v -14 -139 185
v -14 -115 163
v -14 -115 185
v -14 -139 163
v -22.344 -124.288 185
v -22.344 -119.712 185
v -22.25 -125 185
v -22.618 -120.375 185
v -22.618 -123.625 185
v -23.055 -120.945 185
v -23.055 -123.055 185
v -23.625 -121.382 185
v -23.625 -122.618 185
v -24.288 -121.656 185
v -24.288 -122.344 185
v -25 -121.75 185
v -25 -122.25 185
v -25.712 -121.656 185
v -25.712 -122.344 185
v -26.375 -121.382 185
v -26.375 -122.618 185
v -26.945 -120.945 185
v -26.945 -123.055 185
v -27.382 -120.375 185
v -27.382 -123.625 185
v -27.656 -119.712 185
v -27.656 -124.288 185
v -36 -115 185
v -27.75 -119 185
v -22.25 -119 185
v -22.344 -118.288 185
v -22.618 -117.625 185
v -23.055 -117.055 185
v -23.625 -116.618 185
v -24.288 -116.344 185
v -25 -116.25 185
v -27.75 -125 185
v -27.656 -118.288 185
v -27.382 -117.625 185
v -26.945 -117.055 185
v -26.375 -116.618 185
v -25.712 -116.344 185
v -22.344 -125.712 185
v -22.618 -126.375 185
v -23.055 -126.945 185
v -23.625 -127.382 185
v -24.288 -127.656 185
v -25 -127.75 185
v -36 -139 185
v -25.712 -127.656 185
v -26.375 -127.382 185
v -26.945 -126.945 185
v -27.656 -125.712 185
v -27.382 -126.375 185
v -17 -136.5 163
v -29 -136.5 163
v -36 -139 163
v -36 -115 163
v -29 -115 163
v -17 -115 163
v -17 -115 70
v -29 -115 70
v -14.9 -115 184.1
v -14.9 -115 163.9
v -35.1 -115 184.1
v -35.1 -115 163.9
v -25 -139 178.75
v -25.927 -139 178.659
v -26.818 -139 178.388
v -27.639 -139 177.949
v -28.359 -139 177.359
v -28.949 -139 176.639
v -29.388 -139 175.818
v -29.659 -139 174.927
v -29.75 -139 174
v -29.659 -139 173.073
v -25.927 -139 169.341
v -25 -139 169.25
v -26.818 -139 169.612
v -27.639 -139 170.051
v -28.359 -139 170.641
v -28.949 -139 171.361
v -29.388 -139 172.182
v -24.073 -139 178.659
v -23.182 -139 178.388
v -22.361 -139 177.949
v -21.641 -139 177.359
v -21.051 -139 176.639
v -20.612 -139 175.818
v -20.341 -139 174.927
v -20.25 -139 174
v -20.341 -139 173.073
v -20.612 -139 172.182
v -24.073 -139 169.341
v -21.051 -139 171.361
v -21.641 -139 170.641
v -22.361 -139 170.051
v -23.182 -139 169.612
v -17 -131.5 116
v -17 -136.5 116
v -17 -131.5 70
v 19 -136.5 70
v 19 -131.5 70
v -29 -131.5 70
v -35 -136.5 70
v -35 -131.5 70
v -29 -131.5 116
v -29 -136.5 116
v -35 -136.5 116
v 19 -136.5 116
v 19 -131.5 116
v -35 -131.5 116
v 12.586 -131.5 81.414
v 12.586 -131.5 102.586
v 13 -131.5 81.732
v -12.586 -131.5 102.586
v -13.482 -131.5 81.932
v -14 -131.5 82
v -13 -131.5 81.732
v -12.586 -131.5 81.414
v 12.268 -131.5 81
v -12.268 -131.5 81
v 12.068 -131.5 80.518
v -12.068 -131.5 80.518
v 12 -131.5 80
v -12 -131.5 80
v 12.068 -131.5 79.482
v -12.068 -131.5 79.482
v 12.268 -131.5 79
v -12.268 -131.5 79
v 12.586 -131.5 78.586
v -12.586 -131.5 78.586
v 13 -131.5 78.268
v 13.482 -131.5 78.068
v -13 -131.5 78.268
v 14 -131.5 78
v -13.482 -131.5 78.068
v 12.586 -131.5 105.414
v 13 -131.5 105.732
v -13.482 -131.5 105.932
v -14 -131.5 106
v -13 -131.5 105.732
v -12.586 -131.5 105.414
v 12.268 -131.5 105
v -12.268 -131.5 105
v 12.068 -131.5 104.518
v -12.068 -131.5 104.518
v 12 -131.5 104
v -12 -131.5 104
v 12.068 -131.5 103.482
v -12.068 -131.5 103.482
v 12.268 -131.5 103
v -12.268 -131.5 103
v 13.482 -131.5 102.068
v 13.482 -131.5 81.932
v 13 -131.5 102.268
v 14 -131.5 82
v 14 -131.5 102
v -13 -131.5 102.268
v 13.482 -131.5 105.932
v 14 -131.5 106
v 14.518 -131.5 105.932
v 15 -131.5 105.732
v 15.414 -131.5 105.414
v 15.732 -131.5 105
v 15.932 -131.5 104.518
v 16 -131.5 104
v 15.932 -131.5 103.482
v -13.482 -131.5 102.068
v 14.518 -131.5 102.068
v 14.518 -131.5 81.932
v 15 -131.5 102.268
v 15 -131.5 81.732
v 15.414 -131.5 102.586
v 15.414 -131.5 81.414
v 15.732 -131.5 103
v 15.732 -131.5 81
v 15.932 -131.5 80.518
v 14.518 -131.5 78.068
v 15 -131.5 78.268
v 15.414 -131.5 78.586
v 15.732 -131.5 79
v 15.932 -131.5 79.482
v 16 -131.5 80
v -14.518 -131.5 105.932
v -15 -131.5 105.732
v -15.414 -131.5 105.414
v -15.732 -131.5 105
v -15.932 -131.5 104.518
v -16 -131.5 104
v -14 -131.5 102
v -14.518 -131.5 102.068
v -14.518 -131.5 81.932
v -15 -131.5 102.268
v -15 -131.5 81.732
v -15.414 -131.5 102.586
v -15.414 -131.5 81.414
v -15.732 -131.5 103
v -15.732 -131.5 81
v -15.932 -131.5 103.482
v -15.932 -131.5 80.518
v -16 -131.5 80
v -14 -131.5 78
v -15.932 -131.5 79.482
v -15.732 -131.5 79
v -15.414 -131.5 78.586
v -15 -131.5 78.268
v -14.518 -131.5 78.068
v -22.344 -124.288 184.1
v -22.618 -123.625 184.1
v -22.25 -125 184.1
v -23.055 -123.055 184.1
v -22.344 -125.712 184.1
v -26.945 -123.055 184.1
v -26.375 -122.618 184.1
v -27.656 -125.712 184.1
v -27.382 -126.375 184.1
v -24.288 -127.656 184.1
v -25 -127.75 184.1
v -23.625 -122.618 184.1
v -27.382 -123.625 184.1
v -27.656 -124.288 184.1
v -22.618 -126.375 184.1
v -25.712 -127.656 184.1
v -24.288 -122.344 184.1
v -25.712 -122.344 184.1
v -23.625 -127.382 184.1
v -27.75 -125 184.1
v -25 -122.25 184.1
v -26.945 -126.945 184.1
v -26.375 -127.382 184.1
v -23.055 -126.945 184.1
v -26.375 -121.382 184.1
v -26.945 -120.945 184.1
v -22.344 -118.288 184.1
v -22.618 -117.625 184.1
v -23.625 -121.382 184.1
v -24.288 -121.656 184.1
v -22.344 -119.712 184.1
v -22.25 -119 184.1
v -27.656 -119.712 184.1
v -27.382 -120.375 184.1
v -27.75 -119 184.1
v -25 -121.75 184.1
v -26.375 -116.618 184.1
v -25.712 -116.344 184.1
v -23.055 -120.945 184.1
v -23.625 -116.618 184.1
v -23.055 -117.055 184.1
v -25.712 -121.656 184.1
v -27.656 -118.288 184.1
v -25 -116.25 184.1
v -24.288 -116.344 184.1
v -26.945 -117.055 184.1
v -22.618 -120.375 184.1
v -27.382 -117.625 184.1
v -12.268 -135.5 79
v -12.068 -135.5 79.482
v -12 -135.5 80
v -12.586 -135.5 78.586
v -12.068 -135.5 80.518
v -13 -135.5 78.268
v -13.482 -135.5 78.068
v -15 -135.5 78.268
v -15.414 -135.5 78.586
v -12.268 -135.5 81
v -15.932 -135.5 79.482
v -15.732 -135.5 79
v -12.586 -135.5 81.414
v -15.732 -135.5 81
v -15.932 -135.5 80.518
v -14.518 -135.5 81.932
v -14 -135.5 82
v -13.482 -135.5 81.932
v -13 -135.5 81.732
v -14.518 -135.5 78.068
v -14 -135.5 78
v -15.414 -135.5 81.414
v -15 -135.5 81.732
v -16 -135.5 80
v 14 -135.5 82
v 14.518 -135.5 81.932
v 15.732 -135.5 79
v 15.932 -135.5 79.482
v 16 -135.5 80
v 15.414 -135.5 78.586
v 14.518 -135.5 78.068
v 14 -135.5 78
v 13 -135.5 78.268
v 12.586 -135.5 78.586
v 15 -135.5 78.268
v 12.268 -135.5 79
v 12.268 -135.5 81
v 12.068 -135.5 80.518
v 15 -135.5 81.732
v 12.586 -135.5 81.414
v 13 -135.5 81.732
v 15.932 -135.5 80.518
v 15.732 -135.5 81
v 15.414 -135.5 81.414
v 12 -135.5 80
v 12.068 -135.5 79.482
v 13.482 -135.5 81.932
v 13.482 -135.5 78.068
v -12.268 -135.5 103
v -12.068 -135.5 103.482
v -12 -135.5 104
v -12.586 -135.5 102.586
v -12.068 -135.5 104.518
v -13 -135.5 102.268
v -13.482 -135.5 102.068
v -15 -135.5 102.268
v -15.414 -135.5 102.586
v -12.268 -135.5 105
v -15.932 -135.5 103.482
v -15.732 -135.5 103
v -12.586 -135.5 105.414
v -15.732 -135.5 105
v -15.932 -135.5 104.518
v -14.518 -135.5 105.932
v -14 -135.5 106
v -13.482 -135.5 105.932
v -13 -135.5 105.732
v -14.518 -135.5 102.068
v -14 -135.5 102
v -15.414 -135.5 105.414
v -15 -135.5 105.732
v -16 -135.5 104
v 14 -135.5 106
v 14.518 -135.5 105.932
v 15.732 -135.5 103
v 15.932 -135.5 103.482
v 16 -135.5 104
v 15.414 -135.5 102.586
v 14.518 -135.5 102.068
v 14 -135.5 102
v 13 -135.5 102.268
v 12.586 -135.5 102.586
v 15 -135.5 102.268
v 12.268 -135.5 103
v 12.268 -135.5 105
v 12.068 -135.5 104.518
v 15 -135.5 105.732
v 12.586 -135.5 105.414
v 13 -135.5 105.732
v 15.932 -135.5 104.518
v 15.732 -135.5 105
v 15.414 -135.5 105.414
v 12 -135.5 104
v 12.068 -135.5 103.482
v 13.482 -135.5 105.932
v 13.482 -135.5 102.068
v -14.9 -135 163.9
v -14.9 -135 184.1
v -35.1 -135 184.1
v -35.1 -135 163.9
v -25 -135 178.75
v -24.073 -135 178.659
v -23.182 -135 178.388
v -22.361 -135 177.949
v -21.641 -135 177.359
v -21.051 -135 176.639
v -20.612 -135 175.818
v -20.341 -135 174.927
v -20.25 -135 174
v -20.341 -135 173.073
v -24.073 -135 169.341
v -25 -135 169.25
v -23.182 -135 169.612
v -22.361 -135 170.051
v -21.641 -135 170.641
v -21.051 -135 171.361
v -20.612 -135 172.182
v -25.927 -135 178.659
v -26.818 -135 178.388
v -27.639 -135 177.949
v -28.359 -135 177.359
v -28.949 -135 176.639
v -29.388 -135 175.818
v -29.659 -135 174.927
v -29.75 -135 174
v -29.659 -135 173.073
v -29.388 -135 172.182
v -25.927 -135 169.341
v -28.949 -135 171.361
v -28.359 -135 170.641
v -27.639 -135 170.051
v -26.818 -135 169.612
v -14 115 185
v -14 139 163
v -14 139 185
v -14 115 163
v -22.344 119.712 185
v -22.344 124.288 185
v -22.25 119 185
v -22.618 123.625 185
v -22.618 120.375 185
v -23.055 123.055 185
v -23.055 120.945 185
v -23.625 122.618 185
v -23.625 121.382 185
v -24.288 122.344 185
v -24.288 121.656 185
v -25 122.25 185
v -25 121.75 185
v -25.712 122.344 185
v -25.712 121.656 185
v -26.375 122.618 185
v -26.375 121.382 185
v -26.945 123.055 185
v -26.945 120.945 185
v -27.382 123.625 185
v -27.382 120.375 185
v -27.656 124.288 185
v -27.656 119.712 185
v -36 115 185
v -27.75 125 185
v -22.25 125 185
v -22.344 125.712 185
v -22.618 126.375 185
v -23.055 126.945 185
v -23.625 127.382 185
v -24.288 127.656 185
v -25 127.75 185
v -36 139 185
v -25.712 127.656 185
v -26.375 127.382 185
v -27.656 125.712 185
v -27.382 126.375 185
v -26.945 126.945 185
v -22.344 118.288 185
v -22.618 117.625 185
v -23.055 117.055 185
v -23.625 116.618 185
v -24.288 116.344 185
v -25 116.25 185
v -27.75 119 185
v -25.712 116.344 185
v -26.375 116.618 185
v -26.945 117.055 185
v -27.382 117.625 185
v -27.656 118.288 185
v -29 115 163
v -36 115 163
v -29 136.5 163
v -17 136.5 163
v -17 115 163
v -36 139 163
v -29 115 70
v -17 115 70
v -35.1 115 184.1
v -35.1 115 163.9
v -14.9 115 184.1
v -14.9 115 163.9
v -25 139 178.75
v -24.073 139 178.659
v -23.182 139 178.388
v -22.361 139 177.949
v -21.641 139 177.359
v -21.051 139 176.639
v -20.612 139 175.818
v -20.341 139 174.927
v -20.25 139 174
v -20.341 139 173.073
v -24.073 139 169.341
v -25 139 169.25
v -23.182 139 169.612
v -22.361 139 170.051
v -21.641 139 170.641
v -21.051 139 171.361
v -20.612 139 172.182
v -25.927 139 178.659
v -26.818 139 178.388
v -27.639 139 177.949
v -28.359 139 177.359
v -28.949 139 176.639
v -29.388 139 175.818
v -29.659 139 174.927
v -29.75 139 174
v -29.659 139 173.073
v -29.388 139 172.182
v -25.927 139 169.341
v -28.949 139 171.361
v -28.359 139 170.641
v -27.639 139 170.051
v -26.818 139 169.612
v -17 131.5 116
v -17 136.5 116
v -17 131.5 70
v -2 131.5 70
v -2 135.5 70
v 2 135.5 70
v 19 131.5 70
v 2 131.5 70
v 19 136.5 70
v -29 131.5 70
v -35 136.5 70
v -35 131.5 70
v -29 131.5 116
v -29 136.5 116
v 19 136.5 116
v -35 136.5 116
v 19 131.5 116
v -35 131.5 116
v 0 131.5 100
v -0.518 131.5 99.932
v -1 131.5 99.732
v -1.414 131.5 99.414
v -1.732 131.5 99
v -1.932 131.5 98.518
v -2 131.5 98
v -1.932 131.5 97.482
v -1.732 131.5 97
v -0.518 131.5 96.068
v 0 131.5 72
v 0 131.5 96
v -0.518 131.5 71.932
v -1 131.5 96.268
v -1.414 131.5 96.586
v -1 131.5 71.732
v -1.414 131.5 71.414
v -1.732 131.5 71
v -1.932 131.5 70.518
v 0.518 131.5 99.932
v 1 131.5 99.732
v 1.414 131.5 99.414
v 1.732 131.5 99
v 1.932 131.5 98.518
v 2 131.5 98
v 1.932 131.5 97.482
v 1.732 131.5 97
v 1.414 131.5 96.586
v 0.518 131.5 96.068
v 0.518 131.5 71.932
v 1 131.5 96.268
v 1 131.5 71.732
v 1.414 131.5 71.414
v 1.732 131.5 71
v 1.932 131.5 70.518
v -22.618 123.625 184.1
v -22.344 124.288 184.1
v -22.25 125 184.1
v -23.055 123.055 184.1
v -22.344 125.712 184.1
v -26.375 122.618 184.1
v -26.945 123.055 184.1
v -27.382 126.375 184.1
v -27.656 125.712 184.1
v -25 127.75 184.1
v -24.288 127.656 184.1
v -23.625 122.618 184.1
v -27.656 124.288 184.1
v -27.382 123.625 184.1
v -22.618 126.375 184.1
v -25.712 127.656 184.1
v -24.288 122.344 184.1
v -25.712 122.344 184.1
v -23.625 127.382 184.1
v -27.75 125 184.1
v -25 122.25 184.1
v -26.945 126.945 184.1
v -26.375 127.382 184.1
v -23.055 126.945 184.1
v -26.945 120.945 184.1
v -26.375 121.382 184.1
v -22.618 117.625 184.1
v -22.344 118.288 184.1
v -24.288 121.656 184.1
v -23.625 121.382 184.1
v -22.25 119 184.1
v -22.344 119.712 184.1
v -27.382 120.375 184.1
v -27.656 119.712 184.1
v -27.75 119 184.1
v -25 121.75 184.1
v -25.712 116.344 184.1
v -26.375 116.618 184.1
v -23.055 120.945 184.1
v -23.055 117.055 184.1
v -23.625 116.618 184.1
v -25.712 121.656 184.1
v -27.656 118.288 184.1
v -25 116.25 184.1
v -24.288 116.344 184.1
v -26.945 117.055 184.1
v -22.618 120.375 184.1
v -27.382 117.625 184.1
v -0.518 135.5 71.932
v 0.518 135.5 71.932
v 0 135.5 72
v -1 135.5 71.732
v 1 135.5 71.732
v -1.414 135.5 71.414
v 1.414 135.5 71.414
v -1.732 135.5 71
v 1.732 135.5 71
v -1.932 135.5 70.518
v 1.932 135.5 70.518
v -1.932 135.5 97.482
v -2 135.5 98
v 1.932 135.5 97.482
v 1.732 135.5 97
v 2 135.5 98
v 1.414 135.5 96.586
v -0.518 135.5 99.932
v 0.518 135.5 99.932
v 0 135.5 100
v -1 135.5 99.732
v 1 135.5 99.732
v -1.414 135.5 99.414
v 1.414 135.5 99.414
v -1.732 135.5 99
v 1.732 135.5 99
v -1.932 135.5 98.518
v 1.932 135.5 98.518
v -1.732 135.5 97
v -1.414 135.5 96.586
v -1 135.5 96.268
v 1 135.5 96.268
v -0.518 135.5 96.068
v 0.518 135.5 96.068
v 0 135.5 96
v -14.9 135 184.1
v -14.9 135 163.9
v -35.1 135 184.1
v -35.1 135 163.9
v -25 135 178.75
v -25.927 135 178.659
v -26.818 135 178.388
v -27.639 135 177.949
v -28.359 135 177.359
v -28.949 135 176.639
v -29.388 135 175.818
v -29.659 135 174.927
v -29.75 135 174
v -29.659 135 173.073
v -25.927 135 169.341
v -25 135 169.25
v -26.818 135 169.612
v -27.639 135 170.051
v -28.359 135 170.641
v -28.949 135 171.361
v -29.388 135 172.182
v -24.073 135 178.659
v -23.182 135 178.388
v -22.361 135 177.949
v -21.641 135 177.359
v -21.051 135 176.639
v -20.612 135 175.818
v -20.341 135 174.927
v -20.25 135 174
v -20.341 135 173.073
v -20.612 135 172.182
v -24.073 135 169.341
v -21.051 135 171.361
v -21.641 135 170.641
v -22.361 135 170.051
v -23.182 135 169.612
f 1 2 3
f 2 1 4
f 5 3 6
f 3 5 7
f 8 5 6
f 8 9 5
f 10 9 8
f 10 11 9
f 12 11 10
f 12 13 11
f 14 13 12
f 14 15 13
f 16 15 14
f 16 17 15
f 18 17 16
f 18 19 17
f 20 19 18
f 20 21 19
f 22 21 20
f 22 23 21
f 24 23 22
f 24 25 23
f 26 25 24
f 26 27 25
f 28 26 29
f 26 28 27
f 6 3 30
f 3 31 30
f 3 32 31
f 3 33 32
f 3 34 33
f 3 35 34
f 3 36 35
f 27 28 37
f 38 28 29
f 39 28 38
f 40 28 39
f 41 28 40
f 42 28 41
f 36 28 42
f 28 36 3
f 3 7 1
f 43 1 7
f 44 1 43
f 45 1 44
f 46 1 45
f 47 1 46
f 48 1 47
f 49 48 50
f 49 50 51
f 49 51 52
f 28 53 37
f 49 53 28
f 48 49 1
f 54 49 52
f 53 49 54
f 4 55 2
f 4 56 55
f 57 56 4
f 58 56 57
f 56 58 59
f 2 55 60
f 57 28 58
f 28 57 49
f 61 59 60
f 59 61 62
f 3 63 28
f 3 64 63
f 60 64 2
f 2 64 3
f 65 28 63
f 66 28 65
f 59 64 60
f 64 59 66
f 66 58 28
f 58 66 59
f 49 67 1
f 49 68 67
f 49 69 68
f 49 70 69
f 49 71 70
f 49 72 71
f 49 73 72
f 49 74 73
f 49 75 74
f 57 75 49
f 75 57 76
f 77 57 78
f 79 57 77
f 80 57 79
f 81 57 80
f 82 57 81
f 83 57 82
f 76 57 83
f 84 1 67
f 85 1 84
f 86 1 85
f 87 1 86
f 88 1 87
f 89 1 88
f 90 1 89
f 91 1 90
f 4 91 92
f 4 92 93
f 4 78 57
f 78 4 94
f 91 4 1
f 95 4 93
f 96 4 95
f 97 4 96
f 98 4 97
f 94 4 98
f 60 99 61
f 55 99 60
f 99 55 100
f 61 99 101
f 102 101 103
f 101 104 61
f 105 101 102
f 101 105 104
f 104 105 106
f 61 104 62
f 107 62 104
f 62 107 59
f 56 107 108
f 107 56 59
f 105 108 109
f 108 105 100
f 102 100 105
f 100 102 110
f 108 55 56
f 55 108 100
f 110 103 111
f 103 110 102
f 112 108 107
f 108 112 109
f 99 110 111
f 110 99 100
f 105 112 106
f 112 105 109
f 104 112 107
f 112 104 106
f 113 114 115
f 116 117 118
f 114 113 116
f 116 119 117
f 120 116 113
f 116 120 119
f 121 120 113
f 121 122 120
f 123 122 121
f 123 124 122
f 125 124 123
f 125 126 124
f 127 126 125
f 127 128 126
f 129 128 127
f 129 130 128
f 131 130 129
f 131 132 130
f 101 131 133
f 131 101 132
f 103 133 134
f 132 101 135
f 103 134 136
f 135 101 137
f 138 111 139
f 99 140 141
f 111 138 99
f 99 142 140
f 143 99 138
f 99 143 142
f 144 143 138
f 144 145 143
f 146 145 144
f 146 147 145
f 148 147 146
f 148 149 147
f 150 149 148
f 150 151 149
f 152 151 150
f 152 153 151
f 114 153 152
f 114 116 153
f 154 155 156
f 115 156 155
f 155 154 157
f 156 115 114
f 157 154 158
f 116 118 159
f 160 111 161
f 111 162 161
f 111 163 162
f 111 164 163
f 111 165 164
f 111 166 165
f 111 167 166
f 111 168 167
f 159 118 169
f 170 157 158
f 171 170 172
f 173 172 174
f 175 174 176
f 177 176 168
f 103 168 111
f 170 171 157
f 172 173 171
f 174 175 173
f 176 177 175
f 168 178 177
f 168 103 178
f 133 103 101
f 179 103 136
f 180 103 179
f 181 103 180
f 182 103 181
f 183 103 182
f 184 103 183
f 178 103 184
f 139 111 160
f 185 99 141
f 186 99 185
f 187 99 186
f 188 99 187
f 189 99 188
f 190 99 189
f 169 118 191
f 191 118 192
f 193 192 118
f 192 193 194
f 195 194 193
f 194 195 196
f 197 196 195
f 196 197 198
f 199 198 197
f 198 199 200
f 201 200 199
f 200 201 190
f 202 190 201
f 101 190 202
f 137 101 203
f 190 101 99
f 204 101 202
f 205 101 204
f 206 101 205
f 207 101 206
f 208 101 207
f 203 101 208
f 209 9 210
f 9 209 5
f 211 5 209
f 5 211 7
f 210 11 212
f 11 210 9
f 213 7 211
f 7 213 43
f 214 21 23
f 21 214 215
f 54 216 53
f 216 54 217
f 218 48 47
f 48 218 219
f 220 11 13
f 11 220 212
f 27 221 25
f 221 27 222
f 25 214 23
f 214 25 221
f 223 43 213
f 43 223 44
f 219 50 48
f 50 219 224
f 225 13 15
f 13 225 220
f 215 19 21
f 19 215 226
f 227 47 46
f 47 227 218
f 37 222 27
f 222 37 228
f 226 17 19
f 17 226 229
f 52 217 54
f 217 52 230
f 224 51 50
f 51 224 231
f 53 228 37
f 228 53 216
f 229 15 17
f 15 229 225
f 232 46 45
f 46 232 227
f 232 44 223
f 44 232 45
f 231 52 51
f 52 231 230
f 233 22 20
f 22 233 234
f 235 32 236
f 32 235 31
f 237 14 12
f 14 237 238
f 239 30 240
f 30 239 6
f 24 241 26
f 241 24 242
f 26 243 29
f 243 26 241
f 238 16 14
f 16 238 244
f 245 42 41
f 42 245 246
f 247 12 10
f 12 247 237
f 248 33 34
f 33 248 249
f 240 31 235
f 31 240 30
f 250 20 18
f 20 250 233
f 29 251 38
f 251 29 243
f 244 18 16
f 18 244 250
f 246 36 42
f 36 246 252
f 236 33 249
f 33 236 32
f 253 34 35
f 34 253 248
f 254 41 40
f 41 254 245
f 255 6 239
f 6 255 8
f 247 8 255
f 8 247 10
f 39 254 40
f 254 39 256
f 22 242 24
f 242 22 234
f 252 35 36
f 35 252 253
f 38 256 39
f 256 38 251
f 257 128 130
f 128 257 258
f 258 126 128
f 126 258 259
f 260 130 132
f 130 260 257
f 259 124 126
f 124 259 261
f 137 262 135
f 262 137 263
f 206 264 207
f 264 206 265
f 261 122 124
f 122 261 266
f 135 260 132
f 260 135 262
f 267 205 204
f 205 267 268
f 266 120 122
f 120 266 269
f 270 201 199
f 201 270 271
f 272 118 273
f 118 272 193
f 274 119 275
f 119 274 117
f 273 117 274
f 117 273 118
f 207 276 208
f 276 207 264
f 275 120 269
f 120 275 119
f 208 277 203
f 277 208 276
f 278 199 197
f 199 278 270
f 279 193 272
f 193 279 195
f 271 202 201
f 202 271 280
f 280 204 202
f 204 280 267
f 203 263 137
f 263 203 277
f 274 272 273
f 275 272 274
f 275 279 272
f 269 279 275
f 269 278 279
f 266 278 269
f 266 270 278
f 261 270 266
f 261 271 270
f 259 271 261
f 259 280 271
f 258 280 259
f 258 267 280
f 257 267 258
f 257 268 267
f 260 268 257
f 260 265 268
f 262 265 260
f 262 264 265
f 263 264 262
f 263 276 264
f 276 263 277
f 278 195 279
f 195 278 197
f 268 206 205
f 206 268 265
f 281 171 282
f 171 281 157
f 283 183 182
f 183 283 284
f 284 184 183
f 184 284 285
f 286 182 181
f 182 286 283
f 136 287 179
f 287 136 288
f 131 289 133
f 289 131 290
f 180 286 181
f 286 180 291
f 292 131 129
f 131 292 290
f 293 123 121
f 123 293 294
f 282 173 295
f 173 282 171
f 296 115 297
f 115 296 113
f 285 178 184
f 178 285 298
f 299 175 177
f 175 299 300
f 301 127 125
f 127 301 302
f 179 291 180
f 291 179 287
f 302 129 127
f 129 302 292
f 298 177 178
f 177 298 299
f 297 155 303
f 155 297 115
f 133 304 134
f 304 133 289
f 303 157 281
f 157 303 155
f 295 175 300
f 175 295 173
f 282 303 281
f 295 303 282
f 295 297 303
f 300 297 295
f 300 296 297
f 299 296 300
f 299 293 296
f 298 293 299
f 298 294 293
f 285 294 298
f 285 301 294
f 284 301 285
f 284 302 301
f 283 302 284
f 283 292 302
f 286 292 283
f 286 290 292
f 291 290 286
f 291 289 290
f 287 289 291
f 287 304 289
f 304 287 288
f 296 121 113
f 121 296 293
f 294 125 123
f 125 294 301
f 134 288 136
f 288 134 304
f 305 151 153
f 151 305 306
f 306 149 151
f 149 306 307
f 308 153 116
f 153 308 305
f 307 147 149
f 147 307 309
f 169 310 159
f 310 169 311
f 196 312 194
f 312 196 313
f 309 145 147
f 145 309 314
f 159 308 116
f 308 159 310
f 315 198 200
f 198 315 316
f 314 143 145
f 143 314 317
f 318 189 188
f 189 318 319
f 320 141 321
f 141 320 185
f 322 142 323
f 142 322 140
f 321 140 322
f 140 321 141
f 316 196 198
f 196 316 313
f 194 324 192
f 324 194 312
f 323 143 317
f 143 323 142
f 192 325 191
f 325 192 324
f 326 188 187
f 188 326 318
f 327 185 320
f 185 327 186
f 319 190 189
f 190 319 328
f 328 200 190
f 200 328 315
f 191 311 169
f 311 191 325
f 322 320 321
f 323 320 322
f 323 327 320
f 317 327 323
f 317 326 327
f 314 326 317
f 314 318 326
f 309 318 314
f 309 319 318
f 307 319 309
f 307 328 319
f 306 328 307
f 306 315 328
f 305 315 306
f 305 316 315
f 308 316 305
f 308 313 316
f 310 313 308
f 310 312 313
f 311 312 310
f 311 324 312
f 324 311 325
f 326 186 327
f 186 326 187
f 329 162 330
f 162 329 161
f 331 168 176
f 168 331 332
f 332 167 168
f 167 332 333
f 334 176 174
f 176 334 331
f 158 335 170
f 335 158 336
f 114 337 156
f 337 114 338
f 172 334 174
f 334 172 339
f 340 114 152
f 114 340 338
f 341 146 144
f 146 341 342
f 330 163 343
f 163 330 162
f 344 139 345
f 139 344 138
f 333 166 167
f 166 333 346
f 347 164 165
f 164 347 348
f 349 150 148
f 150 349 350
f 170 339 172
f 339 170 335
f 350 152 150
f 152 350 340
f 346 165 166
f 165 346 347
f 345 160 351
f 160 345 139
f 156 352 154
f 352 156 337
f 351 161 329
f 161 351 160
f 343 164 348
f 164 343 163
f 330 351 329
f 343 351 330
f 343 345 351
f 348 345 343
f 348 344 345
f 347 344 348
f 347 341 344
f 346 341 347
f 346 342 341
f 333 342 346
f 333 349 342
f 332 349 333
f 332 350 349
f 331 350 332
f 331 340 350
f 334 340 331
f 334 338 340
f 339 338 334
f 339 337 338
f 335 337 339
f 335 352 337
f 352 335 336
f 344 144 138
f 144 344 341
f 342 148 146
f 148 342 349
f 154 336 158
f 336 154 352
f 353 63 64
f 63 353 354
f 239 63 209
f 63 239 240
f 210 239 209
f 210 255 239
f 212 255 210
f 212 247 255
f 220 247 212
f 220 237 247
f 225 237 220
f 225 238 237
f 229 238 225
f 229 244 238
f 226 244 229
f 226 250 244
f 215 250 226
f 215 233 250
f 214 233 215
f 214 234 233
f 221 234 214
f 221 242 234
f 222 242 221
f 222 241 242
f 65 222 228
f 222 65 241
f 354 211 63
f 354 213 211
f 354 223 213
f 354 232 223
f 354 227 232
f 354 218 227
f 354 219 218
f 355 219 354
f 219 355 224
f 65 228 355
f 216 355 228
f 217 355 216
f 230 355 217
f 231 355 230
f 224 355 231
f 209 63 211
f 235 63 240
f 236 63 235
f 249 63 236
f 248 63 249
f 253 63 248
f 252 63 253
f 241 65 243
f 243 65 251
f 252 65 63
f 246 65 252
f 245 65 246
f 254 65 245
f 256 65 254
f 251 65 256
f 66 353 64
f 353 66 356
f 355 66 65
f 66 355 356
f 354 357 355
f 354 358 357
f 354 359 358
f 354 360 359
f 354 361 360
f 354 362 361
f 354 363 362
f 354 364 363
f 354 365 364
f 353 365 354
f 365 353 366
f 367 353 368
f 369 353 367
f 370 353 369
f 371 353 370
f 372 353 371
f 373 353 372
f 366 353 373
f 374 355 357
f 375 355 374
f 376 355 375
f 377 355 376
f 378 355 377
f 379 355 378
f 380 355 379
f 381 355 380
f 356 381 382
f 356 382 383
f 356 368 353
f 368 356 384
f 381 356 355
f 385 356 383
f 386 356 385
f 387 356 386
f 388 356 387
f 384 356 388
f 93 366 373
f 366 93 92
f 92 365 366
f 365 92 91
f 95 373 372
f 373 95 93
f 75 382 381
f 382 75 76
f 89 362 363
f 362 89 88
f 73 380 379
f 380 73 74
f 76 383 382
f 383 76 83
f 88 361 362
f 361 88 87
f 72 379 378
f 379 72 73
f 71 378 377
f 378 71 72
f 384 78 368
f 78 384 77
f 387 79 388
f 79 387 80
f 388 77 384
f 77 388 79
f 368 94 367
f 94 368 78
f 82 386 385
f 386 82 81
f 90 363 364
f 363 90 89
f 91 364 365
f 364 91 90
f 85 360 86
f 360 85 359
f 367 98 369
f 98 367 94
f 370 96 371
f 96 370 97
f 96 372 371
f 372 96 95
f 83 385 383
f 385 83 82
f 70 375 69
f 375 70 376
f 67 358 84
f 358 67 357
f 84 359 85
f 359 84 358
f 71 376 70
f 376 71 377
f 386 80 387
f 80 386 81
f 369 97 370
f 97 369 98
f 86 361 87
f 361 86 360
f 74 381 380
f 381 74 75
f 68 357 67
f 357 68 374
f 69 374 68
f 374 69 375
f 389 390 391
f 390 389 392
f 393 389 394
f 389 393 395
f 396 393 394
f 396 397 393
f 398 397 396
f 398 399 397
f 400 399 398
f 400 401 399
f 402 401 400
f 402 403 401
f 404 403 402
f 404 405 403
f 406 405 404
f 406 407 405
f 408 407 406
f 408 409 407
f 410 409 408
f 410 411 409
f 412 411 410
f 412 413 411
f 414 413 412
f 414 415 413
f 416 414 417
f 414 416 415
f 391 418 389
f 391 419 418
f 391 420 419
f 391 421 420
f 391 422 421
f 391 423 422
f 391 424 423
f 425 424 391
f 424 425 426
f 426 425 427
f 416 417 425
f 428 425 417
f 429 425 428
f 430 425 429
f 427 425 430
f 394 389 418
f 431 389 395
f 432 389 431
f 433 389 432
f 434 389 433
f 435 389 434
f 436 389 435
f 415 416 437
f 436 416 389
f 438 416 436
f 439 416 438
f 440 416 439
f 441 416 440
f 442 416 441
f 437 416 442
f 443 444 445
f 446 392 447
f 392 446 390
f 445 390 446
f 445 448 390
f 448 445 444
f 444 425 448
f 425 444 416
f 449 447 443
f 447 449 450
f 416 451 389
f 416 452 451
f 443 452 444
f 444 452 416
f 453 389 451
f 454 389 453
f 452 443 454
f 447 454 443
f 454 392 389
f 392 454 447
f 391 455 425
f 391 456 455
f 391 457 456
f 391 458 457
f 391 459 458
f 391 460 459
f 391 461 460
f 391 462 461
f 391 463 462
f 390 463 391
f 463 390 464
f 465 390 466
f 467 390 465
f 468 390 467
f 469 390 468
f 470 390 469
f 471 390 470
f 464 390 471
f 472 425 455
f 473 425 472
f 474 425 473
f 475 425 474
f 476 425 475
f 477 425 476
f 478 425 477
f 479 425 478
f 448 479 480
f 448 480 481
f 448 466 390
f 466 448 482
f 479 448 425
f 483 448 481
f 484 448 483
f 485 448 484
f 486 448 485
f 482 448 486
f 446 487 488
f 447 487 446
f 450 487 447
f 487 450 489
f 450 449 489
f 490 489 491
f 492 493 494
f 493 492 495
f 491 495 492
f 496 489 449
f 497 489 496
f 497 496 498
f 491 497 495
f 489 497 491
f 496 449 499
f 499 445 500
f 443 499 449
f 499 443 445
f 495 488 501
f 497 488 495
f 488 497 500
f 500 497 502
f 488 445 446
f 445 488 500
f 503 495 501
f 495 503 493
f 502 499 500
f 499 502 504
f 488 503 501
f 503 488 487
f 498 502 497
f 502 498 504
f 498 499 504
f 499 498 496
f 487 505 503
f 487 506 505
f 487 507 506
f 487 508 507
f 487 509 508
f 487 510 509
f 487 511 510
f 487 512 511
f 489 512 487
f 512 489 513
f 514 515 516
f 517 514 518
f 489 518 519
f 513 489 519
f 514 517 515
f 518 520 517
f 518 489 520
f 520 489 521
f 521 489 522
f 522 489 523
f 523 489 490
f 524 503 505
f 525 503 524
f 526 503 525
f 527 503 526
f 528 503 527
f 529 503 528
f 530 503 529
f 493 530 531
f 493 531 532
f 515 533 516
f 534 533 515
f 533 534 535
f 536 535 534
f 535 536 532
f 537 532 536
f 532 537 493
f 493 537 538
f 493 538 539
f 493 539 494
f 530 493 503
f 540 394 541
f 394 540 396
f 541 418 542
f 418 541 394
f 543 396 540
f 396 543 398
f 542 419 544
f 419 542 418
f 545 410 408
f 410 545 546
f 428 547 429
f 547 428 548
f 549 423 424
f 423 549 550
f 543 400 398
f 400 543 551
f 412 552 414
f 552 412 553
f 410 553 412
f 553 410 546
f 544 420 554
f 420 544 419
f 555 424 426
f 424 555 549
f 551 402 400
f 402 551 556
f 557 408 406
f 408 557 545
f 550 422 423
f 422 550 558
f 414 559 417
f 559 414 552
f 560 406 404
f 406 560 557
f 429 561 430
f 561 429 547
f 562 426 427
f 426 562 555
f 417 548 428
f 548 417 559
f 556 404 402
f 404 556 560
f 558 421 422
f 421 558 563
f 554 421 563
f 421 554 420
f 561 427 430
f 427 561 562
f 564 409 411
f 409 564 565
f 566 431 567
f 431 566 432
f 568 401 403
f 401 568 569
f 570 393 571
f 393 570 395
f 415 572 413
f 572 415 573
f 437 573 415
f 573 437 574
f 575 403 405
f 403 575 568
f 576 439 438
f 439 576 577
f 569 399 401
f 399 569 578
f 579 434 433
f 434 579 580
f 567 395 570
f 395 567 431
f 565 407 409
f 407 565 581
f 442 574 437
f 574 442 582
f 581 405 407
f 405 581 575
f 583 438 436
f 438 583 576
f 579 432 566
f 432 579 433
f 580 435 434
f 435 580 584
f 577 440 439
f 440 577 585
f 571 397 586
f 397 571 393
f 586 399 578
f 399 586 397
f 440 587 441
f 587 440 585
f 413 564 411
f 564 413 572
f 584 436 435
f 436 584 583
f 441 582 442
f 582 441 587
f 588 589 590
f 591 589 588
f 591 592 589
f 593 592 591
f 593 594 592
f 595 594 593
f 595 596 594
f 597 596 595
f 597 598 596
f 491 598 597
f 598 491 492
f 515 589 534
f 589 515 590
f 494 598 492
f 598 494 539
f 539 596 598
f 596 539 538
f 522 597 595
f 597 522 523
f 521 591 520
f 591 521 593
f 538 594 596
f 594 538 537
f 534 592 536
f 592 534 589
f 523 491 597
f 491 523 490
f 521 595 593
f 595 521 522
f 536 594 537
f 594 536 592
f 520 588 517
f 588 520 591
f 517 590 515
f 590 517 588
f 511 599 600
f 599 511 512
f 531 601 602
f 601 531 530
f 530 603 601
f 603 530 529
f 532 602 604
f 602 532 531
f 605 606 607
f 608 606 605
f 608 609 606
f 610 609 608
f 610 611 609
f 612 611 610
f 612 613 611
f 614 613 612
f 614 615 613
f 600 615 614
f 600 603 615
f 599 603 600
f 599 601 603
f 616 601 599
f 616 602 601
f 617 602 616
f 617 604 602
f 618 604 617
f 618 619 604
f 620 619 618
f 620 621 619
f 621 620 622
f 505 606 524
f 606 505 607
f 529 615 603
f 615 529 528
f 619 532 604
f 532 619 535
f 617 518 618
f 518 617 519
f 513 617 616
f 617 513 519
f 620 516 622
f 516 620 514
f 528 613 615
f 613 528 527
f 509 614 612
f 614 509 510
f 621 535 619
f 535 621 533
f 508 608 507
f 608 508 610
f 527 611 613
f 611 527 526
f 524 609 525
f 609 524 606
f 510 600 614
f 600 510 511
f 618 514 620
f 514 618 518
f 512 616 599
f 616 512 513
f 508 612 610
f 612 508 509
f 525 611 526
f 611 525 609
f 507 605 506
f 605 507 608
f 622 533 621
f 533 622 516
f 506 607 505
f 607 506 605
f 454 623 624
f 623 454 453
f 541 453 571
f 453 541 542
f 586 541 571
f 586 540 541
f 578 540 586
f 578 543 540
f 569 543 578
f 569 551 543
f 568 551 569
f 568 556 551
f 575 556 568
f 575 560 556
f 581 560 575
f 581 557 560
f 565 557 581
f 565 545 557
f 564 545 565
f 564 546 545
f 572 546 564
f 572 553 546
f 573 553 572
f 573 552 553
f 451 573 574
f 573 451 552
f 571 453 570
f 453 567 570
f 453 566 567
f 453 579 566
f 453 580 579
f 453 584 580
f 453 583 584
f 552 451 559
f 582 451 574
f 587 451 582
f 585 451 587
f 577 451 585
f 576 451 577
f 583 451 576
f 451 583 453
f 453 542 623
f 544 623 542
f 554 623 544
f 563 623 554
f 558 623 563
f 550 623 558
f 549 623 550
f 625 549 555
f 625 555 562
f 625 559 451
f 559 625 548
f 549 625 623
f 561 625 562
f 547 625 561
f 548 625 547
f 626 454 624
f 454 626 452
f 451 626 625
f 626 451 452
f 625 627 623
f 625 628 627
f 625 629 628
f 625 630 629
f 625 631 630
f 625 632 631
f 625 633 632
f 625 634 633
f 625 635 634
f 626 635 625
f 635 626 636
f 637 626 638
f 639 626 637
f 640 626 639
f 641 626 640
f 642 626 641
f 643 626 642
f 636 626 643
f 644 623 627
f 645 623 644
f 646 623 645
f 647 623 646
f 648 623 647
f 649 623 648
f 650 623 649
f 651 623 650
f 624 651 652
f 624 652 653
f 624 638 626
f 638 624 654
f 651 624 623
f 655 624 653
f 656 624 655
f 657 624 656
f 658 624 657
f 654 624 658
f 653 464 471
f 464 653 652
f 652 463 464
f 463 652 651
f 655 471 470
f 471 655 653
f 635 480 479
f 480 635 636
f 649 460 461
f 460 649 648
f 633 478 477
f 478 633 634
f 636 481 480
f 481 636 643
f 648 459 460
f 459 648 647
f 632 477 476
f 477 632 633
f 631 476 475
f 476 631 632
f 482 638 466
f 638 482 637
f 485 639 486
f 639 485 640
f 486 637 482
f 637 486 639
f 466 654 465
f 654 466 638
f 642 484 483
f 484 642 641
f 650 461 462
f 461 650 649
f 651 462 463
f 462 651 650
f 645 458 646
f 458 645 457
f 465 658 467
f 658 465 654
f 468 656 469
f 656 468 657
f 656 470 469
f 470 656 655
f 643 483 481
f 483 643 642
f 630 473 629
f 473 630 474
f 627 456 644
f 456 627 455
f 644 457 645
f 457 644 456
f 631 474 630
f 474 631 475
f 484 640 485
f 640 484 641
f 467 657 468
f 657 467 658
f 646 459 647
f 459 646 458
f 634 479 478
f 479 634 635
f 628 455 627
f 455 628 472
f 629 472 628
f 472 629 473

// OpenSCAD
// =====================================================================
//  p11_p12_drop_legs.scad - P11 drop leg, servo side (-Y) and P12 drop leg, idler side (+Y, mirror)
//  PROJECT SCRATCH · 05-engineering/cad/frame · units: mm · frame: global (section 2)
//  Sources: mechanical.md section 5.2 (legs bolt to the 270 mm beam's end faces: M5 end-tap screw + 2 T-nut screws,
//  come down and forward to the elbow axis; servo cradle on the -Y foot, idler housing on the +Y foot), 2 (legs at
//  Y +/-115..135), 11 P11/P12.  PART = "servo" | "idler" | "both".  Print on the side.
//  Top block: socket over the beam end (20 deep) with the end-screw wall at Y -139..-135; bar 12 x 20 down behind
//  the cradle (X -27..-15); foot flange 5 thick at Y -135..-130, X -35..+15, Z 70..116, carrying 4 M3 inserts for
//  P13 (P12: 2 inserts for P15).  Envelope 51 x 24 x 115 vs section 11's 50 x 20 x 105 (C-F6).
// =====================================================================
include <lib_sp1.scad>
PART = "both";
TOP_X0 = -36;  TOP_X1 = -14;  TOP_Y0 = -139;  TOP_Y1 = -115;  TOP_Z0 = 163;  TOP_Z1 = 185;  SOCK_L = 20;
TNUT_Y = [-125, -119];
BAR_X0 = -29;  BAR_X1 = -17;  BAR_Y0 = -136.5;  BAR_Y1 = -115;  BAR_Z0 = 70;   // behind the 34-wide cradle (X -17)
FL_X0 = -35;  FL_X1 = 19;  FL_Y0 = -136.5;  FL_Y1 = -131.5;  FL_Z0 = 70;  FL_Z1 = 116;   // FRAME-ONLY part (crown mount supersedes it)
FOOT_INS = [[-14, 80], [14, 80], [-14, 104], [14, 104]];   // P13 servo cradle (clear of the XL330 16 x 30 back-face pattern)
FOOT_INS_IDLER = [[0, 70], [0, 98]];                        // P15 idler housing
BEAM_CX = (BEAM[0] + BEAM[1]) / 2;  BEAM_CZ = (BEAM[4] + BEAM[5]) / 2;

module drop_leg(holes) difference() {
    union() {
        box(TOP_X0, TOP_X1, TOP_Y0, TOP_Y1, TOP_Z0, TOP_Z1);
        box(BAR_X0, BAR_X1, BAR_Y0, BAR_Y1, BAR_Z0, TOP_Z0 + 0.01);
        box(FL_X0, FL_X1, FL_Y0, FL_Y1, FL_Z0, FL_Z1);
        box(BAR_X0, BAR_X1, FL_Y0, FL_Y1 + 0.01, FL_Z0, TOP_Z0);
    }
    socket_2020_y(BEAM_CX, BEAM_CZ, TOP_Y1 - SOCK_L, TOP_Y1 + 1);
    cyl_y(M5_CLEAR / 2, TOP_Y0 - 1, TOP_Y1, BEAM_CX, BEAM_CZ, fn = 24);                    // M5 into the extrusion's end tap
    cyl_y(M5_HEAD_D / 2, TOP_Y0 - 1, TOP_Y0 + M5_HEAD_H, BEAM_CX, BEAM_CZ, fn = 32);
    for (yy = TNUT_Y) cyl_z(M5_CLEAR / 2, BEAM_CZ, TOP_Z1 + 1, BEAM_CX, yy, fn = 24);        // 2 T-nut screws into the top slot
    for (h = holes) ins_y(M3_INS_D, M3_INS_L, h[0], h[1], FL_Y1, -1);                        // flange inserts (+Y face)
}
module p11_drop_leg_servo() drop_leg(FOOT_INS);
module p12_drop_leg_idler() mirror_y() drop_leg(FOOT_INS_IDLER);
if (PART == "servo" || PART == "both") p11_drop_leg_servo();
if (PART == "idler" || PART == "both") p12_drop_leg_idler();
